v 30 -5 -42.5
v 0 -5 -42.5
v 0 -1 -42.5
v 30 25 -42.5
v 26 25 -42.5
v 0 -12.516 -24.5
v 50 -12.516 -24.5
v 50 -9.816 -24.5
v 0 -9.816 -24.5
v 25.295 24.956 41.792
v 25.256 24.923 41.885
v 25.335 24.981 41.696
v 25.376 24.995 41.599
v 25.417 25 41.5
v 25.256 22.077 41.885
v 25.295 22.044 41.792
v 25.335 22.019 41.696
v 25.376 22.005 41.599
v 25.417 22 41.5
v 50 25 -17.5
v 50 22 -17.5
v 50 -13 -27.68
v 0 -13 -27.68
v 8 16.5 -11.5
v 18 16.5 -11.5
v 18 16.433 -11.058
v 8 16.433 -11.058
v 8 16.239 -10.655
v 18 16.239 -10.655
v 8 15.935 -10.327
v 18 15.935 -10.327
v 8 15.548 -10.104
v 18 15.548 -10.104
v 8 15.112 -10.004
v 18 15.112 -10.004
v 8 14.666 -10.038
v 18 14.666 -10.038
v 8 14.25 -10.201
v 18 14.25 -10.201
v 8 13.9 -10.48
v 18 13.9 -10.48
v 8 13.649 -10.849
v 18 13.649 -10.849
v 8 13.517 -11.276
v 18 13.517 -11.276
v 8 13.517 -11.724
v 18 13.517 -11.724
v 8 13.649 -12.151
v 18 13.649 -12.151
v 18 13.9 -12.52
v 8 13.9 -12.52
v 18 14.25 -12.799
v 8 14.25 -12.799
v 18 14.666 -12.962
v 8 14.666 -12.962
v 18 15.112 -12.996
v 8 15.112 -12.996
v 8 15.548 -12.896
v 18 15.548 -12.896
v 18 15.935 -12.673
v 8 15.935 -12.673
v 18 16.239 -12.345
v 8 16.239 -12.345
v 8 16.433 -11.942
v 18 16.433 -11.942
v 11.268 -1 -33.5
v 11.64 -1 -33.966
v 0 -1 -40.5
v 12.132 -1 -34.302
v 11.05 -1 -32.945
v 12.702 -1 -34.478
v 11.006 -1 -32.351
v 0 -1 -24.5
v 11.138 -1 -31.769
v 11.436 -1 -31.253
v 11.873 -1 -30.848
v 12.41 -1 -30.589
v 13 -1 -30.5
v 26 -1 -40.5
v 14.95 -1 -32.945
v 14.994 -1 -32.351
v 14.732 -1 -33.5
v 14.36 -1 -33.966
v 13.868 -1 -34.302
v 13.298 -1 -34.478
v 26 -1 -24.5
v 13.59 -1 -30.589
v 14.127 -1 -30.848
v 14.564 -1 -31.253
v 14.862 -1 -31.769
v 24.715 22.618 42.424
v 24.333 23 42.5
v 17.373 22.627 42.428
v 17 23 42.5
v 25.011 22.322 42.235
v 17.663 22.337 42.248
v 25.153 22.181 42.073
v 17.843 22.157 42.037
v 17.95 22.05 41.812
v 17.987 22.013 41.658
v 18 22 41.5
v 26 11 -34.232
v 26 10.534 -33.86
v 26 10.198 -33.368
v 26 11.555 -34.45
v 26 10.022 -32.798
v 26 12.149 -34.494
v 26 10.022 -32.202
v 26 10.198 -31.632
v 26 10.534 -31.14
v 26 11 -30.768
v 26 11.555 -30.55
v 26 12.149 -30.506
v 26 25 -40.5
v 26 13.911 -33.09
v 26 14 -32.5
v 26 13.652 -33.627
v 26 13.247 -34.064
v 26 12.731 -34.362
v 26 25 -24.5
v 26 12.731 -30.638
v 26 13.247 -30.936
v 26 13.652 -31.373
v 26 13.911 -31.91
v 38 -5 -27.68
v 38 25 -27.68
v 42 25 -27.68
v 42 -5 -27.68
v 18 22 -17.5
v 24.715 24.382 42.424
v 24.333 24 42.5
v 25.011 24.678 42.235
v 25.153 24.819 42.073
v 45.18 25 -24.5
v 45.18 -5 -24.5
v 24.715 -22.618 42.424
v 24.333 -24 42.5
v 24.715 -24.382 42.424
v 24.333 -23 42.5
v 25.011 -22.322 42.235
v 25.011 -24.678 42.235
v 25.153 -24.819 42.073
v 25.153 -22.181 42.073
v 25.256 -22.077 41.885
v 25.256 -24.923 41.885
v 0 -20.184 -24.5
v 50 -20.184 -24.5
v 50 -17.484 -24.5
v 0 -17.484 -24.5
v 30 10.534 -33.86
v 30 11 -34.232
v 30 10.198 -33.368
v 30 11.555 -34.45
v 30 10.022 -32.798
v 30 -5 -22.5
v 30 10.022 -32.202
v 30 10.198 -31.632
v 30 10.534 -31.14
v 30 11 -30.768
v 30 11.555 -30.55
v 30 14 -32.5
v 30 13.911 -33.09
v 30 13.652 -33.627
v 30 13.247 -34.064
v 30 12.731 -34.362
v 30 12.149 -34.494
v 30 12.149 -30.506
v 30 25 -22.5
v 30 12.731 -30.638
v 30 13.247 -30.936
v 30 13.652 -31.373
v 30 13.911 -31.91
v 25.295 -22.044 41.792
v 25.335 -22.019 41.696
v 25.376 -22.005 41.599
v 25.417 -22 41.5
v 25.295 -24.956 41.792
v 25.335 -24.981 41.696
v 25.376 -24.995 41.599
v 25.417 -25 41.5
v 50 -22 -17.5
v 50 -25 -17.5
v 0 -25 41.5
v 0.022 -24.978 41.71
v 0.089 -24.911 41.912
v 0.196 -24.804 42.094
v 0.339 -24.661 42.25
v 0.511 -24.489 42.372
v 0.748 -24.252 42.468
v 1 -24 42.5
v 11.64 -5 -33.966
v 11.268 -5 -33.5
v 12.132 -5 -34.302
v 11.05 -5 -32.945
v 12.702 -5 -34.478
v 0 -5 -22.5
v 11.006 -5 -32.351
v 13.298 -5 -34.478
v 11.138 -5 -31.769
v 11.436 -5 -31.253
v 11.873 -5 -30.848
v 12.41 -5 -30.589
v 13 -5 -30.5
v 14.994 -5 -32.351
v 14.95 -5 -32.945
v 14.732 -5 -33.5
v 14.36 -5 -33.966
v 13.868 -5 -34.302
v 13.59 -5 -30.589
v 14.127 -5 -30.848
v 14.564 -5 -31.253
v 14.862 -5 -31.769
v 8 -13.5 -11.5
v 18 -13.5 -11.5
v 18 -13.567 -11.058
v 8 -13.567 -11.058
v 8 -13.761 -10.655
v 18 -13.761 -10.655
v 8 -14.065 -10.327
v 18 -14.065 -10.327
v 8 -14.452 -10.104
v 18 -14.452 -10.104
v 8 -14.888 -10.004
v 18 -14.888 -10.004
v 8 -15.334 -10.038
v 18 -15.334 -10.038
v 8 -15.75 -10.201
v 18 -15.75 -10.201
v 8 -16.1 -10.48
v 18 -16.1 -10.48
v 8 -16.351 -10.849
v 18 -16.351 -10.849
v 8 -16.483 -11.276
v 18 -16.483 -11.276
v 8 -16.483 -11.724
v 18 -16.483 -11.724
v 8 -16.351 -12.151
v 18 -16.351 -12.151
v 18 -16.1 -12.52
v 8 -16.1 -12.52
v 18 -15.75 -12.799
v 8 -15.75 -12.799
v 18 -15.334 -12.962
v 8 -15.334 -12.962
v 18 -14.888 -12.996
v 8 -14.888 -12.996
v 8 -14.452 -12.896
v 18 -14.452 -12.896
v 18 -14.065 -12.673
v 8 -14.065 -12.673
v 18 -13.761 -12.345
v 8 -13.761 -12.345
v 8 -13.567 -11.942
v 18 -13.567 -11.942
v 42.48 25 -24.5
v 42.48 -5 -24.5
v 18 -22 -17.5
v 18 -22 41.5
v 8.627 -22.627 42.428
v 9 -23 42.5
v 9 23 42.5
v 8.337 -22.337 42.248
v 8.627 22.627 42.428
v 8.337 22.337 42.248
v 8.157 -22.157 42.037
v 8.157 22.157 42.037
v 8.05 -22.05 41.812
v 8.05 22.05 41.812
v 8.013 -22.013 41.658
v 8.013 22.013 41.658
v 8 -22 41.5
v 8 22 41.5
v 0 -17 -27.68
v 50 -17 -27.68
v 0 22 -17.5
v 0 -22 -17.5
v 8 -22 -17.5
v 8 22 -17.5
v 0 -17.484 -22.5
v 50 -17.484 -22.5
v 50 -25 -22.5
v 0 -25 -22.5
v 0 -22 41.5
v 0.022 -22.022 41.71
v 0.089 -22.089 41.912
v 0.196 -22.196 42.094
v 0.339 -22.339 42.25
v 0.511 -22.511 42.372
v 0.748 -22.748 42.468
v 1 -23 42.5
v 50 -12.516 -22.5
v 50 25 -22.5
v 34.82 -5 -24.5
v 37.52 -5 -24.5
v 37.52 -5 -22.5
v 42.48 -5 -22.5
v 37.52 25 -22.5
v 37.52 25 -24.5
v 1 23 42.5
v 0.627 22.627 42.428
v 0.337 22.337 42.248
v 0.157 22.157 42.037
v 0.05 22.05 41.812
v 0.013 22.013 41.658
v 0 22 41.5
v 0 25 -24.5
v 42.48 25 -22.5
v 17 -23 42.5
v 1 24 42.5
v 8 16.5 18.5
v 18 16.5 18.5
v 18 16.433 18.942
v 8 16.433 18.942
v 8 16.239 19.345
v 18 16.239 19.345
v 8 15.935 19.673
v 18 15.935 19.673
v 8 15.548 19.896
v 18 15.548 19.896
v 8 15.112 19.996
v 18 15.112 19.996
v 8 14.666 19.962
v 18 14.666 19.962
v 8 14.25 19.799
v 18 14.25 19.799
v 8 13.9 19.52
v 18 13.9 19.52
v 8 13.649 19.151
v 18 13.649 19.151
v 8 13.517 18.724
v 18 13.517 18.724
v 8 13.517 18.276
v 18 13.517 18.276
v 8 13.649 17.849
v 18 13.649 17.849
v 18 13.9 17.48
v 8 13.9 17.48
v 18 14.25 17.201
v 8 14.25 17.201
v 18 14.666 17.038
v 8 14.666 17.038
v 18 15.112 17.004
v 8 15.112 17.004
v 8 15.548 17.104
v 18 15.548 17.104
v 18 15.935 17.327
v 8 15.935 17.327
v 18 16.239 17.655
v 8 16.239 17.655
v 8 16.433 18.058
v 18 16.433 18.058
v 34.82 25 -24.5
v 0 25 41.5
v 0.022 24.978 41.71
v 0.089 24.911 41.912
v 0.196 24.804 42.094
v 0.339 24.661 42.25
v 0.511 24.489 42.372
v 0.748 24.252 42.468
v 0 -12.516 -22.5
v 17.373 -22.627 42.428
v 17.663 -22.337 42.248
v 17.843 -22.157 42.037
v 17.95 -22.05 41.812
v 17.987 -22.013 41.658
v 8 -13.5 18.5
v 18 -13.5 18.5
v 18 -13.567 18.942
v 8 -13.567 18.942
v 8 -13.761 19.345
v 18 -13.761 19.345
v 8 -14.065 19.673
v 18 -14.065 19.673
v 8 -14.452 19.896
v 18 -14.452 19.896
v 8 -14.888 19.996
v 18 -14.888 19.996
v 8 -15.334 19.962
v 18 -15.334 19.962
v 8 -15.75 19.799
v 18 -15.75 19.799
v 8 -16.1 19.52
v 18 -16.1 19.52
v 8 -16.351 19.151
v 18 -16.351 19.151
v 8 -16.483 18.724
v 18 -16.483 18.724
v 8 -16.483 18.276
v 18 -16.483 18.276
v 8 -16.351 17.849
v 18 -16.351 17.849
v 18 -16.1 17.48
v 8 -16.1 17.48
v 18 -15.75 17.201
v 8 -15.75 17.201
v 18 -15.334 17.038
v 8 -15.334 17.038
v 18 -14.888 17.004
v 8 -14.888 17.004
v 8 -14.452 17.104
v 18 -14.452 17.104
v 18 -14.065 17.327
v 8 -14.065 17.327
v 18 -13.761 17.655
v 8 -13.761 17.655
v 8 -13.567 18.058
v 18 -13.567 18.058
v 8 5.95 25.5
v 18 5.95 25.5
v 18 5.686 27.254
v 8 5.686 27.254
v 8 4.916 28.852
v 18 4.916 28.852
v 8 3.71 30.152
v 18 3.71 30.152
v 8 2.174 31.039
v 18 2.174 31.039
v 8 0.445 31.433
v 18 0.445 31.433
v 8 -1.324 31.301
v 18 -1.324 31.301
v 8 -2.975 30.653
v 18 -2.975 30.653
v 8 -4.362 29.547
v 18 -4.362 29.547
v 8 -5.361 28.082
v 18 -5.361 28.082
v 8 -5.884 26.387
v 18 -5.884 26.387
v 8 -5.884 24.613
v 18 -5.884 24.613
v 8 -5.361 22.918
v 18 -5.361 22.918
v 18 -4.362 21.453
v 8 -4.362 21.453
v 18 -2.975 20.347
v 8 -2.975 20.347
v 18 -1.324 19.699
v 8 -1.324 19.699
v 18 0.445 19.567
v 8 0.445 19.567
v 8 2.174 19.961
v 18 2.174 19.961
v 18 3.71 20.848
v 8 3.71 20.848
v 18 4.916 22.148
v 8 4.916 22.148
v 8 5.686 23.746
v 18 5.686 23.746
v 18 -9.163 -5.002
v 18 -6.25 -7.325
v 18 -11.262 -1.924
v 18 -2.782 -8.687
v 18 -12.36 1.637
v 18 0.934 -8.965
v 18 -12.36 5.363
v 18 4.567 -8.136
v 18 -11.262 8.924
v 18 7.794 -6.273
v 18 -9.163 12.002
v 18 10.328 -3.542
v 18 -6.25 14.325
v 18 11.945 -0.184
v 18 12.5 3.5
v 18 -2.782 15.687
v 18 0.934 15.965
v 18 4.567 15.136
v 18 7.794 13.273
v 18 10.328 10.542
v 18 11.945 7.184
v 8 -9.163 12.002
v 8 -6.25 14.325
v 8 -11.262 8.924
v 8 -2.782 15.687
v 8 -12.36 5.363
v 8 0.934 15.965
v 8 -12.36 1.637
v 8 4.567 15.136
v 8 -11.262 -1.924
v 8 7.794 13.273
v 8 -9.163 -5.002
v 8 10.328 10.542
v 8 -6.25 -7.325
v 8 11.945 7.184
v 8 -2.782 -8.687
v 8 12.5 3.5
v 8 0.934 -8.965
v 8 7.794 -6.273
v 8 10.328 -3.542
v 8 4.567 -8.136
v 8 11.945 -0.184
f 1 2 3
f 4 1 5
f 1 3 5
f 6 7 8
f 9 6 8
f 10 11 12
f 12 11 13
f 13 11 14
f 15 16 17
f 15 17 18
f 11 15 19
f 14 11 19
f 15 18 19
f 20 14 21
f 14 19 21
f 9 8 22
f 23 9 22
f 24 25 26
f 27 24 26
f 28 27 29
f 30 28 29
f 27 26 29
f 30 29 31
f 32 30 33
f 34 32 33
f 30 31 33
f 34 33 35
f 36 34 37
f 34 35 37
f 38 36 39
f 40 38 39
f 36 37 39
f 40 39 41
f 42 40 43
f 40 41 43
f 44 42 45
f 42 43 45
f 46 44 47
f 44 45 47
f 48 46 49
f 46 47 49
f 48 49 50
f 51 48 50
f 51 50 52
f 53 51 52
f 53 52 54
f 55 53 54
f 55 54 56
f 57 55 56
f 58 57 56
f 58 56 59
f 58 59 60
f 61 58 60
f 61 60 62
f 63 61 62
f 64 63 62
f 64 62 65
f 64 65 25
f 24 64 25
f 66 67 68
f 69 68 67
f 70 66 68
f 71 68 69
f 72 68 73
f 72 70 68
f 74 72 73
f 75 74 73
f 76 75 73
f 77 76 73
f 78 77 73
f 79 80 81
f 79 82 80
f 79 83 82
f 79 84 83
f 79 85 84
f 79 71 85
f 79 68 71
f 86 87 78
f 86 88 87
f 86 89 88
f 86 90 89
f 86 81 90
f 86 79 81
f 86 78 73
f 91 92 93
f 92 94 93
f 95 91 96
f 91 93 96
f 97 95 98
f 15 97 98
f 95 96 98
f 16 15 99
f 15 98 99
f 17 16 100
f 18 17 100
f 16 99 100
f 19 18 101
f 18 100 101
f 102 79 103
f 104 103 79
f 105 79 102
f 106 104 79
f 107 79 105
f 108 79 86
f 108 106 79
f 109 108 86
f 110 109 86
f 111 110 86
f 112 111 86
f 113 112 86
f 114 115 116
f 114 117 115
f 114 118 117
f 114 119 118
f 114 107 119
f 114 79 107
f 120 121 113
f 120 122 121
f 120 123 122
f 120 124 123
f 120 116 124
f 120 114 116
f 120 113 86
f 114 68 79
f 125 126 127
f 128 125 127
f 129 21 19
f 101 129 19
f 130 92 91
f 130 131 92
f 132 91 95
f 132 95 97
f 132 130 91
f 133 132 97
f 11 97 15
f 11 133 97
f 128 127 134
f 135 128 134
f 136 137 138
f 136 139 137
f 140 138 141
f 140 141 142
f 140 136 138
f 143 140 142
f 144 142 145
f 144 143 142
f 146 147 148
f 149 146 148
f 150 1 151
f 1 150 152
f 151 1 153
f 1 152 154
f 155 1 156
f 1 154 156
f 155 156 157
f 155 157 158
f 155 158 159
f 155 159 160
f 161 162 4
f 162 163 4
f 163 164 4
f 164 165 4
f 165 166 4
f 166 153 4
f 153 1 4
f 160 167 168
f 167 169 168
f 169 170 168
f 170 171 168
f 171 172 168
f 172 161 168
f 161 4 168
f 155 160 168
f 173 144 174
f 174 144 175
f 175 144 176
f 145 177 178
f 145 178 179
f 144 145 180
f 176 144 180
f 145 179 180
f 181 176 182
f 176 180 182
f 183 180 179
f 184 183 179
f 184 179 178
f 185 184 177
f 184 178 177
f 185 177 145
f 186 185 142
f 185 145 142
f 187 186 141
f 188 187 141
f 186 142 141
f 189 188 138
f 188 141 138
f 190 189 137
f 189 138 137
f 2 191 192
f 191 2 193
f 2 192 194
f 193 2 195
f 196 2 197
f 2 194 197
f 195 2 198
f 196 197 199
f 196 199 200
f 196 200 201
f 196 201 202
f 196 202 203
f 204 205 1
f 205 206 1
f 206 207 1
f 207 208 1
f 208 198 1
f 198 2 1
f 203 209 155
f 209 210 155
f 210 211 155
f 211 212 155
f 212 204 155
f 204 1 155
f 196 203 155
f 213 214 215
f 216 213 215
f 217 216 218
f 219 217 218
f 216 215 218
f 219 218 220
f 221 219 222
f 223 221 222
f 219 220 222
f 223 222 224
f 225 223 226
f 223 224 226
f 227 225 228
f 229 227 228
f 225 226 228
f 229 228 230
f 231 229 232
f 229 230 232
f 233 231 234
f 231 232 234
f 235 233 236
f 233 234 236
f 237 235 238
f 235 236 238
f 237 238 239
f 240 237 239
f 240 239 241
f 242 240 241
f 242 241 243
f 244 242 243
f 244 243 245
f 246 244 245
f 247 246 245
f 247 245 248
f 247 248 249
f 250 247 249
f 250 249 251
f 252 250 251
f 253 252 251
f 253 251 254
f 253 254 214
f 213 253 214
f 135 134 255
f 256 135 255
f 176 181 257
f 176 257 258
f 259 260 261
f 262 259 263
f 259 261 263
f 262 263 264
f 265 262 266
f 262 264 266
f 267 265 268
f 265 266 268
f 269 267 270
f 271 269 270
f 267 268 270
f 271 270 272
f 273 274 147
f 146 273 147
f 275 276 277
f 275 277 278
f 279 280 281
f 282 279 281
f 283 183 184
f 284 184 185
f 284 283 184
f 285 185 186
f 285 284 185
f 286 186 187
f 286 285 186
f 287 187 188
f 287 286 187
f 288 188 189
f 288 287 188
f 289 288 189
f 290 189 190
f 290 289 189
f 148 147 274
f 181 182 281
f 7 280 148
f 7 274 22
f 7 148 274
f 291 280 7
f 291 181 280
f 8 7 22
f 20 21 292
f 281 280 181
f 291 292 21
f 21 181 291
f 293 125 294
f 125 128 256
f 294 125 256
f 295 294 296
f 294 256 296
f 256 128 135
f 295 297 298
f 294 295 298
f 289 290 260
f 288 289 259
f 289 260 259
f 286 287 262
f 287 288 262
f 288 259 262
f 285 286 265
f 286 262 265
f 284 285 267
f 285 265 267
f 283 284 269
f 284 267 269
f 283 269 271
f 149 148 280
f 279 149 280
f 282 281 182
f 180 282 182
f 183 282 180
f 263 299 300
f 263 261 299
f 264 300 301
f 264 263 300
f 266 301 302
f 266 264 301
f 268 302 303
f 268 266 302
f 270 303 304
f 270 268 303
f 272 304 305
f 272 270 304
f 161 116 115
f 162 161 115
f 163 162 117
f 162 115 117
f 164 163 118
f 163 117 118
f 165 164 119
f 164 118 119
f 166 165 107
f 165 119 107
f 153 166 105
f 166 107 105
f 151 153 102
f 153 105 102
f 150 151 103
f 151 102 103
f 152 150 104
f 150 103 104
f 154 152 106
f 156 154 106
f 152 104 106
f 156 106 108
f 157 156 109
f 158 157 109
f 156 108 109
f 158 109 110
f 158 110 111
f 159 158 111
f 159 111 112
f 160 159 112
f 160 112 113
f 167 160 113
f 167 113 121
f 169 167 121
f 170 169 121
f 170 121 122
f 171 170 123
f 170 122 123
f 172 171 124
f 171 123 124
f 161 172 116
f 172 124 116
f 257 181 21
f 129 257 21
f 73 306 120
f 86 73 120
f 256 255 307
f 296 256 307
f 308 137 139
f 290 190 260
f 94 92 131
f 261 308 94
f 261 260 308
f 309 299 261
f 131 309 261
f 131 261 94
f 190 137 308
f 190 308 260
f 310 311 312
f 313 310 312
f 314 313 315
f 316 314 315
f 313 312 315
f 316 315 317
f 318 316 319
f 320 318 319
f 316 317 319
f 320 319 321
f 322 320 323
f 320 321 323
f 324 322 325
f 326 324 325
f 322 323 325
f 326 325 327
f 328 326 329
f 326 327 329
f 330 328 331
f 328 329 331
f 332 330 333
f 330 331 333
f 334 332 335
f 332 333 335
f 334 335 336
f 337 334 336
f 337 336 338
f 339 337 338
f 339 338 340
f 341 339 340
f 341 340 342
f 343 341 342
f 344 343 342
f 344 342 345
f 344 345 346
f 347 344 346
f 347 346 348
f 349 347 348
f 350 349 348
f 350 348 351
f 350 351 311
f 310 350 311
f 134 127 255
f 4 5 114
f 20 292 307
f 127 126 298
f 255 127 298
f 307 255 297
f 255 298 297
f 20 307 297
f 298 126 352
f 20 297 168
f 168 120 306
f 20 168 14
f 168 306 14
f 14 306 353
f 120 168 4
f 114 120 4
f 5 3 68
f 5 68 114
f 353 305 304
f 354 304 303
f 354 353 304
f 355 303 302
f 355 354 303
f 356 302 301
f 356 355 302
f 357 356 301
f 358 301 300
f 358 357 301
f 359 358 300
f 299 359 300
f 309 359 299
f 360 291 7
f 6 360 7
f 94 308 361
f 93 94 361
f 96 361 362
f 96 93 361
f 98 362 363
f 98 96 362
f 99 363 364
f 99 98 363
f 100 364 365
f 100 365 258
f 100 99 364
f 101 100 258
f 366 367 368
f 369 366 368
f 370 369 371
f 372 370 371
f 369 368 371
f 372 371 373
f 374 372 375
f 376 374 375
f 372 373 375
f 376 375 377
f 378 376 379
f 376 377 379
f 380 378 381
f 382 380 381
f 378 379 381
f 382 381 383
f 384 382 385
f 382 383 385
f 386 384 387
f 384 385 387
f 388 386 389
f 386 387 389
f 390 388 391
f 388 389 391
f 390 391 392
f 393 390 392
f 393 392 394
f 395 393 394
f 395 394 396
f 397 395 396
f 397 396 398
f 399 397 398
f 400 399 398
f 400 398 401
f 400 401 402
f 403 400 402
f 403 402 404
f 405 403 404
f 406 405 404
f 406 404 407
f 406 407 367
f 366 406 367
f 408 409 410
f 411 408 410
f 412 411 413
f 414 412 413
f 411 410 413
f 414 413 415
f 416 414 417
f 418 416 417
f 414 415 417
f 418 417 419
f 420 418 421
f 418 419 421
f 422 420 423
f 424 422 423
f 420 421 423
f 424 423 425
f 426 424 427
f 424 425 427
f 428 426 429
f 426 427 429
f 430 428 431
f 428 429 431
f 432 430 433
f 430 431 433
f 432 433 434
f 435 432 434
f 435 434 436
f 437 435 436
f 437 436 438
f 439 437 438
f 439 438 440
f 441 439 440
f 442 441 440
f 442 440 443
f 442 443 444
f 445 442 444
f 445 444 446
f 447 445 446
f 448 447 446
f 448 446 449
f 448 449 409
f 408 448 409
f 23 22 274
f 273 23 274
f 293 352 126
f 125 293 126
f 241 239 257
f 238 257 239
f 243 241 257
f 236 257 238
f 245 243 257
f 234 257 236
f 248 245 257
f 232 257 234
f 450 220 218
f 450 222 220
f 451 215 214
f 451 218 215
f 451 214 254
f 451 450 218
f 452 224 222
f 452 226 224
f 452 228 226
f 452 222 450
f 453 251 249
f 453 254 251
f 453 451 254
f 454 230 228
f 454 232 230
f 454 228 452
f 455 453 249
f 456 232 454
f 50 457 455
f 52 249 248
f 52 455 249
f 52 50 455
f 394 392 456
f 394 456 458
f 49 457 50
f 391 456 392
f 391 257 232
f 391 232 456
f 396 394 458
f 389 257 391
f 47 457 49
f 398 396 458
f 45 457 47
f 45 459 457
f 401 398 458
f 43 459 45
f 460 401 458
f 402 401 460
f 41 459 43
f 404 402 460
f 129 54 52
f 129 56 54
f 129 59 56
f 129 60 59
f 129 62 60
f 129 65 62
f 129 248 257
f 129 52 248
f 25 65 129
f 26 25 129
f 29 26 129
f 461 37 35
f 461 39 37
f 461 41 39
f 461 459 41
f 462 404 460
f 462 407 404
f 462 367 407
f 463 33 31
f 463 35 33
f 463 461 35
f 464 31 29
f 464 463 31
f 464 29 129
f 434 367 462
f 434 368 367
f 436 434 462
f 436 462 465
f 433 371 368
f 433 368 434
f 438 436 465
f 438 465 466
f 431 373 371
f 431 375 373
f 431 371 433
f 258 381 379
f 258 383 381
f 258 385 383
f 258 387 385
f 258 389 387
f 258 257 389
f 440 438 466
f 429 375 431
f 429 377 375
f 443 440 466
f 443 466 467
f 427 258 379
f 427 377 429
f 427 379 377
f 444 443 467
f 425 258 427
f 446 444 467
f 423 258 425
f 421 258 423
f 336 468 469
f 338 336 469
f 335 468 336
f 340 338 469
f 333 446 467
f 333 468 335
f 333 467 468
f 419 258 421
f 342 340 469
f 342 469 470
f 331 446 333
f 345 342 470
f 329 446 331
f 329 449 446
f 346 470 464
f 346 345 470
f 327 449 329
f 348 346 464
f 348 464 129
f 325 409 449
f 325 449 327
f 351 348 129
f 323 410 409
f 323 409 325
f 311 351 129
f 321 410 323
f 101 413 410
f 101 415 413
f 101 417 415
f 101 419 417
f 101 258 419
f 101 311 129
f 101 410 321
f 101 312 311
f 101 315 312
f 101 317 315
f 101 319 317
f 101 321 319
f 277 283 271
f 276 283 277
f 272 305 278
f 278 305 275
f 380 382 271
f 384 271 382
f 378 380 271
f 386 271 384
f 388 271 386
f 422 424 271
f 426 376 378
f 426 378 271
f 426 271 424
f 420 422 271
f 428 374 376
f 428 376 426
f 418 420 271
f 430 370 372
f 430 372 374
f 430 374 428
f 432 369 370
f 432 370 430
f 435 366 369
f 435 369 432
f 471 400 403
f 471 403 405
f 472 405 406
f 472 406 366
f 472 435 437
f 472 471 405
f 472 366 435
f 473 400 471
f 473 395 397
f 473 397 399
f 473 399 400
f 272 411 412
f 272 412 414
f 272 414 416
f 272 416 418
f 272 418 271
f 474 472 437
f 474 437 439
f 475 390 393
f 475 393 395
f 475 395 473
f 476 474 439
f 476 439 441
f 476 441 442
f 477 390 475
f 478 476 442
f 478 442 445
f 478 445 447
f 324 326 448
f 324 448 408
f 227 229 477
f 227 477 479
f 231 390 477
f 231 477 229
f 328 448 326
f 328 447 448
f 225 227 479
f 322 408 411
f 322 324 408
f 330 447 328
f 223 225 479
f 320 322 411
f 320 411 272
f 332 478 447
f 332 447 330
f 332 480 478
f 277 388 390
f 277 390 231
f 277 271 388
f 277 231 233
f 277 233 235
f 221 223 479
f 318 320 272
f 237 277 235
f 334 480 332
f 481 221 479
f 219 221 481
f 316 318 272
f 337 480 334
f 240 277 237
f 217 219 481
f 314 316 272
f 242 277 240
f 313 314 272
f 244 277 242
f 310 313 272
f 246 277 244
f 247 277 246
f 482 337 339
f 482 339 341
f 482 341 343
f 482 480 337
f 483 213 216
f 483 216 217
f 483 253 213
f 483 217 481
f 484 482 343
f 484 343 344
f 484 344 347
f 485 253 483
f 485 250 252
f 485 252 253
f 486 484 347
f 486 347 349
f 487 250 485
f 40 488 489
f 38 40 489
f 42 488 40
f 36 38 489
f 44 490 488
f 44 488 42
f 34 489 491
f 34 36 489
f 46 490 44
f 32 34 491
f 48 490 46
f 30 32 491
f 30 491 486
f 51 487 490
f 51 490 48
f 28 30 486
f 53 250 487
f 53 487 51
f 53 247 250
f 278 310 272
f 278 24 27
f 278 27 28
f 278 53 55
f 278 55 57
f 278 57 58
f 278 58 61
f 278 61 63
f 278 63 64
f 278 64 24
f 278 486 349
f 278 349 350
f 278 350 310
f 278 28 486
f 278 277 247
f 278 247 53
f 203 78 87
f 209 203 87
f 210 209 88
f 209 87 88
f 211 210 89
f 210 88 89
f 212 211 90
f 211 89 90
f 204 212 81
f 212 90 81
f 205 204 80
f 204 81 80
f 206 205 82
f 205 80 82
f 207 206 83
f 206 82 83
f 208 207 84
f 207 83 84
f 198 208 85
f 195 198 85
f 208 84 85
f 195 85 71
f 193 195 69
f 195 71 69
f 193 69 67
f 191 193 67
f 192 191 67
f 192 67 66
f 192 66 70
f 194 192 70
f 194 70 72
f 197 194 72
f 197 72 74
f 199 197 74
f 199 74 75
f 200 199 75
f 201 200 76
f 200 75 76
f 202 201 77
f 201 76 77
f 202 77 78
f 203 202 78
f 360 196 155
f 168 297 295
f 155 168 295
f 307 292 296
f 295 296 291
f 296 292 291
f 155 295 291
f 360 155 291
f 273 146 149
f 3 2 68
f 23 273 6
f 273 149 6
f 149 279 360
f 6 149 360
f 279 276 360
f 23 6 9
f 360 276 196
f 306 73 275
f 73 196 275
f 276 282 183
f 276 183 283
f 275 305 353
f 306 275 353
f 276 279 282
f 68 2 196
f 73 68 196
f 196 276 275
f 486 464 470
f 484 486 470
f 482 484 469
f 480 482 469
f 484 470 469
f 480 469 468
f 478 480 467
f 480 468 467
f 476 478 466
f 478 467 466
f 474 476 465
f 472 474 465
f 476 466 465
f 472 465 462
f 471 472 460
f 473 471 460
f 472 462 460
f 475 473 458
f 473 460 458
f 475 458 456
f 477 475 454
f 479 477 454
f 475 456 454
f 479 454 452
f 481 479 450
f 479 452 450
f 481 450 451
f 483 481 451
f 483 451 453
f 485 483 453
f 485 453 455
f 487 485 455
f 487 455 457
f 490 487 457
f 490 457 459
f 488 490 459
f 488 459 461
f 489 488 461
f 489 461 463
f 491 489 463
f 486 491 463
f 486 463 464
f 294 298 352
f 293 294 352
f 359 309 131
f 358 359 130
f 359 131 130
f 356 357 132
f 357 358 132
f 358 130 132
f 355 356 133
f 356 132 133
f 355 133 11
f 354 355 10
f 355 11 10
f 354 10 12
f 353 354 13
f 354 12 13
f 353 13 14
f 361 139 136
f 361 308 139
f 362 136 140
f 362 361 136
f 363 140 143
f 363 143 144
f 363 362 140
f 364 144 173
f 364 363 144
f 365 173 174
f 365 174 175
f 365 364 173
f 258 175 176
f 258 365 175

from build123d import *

# Parameters (mm, degrees)
SKETCH_W        = 50
SKETCH_H        = 85
PAD_DEPTH       = 50
POCKET_DEPTH    = 50
POCKET001_DEPTH = 30
SKETCH003_W     = 16
SKETCH003_H     = 26
POCKET002_DEPTH = 26
SKETCH004_R     = 2
POCKET003_DEPTH = 4
SKETCH005_R     = 2
POCKET004_DEPTH = 4
POCKET005_DEPTH = 2
SKETCH007_W     = 44
SKETCH007_H     = 60
POCKET006_DEPTH = 32
SKETCH008_R     = 12.5
SKETCH008_R_2   = 1.5
SKETCH008_R_3   = 5.95
POCKET007_DEPTH = 18
SKETCH009_W     = 44
SKETCH009_H     = 60
POCKET008_DEPTH = 8
POCKET009_DEPTH = 50.001
FILLET_R        = 1


with BuildPart() as part:
    # Sketch → Pad (new body)
    with BuildSketch(Plane.YZ):
        Rectangle(SKETCH_W, SKETCH_H)
    extrude(amount=PAD_DEPTH)

    # Sketch001 (on Face6 of Pad) → Pocket (cut)
    with BuildSketch(Plane.YZ.offset(50)):
        Polygon((-25, -22.5), (-25, -42.5), (-5, -42.5), (-5, -22.5), (-12.51604, -22.5), (-12.51604, -24.5), (-9.81604, -24.5), (-13, -27.68), (-17, -27.68), (-20.18396, -24.5), (-17.48396, -24.5), (-17.48396, -22.5), align=None)
    extrude(amount=-POCKET_DEPTH, mode=Mode.SUBTRACT)

    # Sketch002 (on Face3 of Pocket) → Pocket001 (cut)
    with BuildSketch(Plane.ZX.offset(25)):
        Polygon((-22.5, 50), (-42.5, 50), (-42.5, 30), (-22.5, 30), (-22.5, 37.52), (-24.5, 37.52), (-24.5, 34.82), (-27.68, 38), (-27.68, 42), (-24.5, 45.18), (-24.5, 42.48), (-22.5, 42.48), align=None)
    extrude(amount=-POCKET001_DEPTH, mode=Mode.SUBTRACT)

    # Sketch003 (on Face3 of Pocket001) → Pocket002 (cut)
    with BuildSketch(Plane.ZX.offset(25)):
        with Locations((-32.5, 13)):
            Rectangle(SKETCH003_W, SKETCH003_H)
    extrude(amount=-POCKET002_DEPTH, mode=Mode.SUBTRACT)

    # Sketch004 (on Face30 of Pocket002) → Pocket003 (cut)
    with BuildSketch(Plane.ZX.offset(-1)):
        with Locations((-32.5, 13)):
            Circle(SKETCH004_R)
    extrude(amount=-POCKET003_DEPTH, mode=Mode.SUBTRACT)

    # Sketch005 (on Face8 of Pocket003) → Pocket004 (cut)
    with BuildSketch(Plane(origin=(26, 0, 0), x_dir=(0, 1, 0), z_dir=(-1, 0, 0))):
        with Locations((12, 32.5)):
            Circle(SKETCH005_R)
    extrude(amount=-POCKET004_DEPTH, mode=Mode.SUBTRACT)

    # Sketch006 (on Face10 of Pocket004) → Pocket005 (cut)
    with BuildSketch(Plane.YX.offset(42.5)):
        Polygon((-1, 0), (25, 26), (25, 0), align=None)
    extrude(amount=-POCKET005_DEPTH, mode=Mode.SUBTRACT)

    # Sketch007 (on Face5 of Pocket005) → Pocket006 (cut)
    with BuildSketch(Plane.YZ.offset(50)):
        with Locations((0, 12.5)):
            Rectangle(SKETCH007_W, SKETCH007_H)
    extrude(amount=-POCKET006_DEPTH, mode=Mode.SUBTRACT)

    # Sketch008 (on Face6 of Pocket006) → Pocket007 (cut)
    with BuildSketch(Plane.YZ.offset(18)):
        with Locations((0, 3.5)):
            Circle(SKETCH008_R)
        with Locations((-15, 18.5)):
            Circle(SKETCH008_R_2)
        with Locations((15, 18.5)):
            Circle(SKETCH008_R_2)
        with Locations((15, -11.5)):
            Circle(SKETCH008_R_2)
        with Locations((-15, -11.5)):
            Circle(SKETCH008_R_2)
        with Locations((0, 25.5)):
            Circle(SKETCH008_R_3)
    extrude(amount=-POCKET007_DEPTH, mode=Mode.SUBTRACT)

    # Sketch009 (on Face2 of Pocket007) → Pocket008 (cut)
    with BuildSketch(Plane(origin=(0, 0, 0), x_dir=(0, 1, 0), z_dir=(-1, 0, 0))):
        with Locations((0, -12.5)):
            Rectangle(SKETCH009_W, SKETCH009_H)
    extrude(amount=-POCKET008_DEPTH, mode=Mode.SUBTRACT)

    # Sketch010 (on Face11 of Pocket008) → Pocket009 (cut, through all)
    with BuildSketch(Plane(origin=(0, -25, 0), x_dir=(0, 0, -1), z_dir=(0, -1, 0))):
        Polygon((17.5, 50), (-42.5, 50), (-42.5, 25), align=None)
    extrude(amount=-POCKET009_DEPTH, mode=Mode.SUBTRACT)

    # Fillet
    fillet_edges = [part.edges().sort_by_distance(p)[0] for p in [
        (18, 0, 42.5),
        (0, -23.5, 42.5),
        (4, -22, 42.5),
        (8, 0, 42.5),
        (4, 22, 42.5),
        (0, 23.5, 42.5),
        (12.5, 25, 42.5),
        (25, 23.5, 42.5),
        (21.5, 22, 42.5),
        (21.5, -22, 42.5),
        (25, -23.5, 42.5),
        (12.5, -25, 42.5),
    ]]
    fillet(fillet_edges, radius=FILLET_R)


solid = part.part
